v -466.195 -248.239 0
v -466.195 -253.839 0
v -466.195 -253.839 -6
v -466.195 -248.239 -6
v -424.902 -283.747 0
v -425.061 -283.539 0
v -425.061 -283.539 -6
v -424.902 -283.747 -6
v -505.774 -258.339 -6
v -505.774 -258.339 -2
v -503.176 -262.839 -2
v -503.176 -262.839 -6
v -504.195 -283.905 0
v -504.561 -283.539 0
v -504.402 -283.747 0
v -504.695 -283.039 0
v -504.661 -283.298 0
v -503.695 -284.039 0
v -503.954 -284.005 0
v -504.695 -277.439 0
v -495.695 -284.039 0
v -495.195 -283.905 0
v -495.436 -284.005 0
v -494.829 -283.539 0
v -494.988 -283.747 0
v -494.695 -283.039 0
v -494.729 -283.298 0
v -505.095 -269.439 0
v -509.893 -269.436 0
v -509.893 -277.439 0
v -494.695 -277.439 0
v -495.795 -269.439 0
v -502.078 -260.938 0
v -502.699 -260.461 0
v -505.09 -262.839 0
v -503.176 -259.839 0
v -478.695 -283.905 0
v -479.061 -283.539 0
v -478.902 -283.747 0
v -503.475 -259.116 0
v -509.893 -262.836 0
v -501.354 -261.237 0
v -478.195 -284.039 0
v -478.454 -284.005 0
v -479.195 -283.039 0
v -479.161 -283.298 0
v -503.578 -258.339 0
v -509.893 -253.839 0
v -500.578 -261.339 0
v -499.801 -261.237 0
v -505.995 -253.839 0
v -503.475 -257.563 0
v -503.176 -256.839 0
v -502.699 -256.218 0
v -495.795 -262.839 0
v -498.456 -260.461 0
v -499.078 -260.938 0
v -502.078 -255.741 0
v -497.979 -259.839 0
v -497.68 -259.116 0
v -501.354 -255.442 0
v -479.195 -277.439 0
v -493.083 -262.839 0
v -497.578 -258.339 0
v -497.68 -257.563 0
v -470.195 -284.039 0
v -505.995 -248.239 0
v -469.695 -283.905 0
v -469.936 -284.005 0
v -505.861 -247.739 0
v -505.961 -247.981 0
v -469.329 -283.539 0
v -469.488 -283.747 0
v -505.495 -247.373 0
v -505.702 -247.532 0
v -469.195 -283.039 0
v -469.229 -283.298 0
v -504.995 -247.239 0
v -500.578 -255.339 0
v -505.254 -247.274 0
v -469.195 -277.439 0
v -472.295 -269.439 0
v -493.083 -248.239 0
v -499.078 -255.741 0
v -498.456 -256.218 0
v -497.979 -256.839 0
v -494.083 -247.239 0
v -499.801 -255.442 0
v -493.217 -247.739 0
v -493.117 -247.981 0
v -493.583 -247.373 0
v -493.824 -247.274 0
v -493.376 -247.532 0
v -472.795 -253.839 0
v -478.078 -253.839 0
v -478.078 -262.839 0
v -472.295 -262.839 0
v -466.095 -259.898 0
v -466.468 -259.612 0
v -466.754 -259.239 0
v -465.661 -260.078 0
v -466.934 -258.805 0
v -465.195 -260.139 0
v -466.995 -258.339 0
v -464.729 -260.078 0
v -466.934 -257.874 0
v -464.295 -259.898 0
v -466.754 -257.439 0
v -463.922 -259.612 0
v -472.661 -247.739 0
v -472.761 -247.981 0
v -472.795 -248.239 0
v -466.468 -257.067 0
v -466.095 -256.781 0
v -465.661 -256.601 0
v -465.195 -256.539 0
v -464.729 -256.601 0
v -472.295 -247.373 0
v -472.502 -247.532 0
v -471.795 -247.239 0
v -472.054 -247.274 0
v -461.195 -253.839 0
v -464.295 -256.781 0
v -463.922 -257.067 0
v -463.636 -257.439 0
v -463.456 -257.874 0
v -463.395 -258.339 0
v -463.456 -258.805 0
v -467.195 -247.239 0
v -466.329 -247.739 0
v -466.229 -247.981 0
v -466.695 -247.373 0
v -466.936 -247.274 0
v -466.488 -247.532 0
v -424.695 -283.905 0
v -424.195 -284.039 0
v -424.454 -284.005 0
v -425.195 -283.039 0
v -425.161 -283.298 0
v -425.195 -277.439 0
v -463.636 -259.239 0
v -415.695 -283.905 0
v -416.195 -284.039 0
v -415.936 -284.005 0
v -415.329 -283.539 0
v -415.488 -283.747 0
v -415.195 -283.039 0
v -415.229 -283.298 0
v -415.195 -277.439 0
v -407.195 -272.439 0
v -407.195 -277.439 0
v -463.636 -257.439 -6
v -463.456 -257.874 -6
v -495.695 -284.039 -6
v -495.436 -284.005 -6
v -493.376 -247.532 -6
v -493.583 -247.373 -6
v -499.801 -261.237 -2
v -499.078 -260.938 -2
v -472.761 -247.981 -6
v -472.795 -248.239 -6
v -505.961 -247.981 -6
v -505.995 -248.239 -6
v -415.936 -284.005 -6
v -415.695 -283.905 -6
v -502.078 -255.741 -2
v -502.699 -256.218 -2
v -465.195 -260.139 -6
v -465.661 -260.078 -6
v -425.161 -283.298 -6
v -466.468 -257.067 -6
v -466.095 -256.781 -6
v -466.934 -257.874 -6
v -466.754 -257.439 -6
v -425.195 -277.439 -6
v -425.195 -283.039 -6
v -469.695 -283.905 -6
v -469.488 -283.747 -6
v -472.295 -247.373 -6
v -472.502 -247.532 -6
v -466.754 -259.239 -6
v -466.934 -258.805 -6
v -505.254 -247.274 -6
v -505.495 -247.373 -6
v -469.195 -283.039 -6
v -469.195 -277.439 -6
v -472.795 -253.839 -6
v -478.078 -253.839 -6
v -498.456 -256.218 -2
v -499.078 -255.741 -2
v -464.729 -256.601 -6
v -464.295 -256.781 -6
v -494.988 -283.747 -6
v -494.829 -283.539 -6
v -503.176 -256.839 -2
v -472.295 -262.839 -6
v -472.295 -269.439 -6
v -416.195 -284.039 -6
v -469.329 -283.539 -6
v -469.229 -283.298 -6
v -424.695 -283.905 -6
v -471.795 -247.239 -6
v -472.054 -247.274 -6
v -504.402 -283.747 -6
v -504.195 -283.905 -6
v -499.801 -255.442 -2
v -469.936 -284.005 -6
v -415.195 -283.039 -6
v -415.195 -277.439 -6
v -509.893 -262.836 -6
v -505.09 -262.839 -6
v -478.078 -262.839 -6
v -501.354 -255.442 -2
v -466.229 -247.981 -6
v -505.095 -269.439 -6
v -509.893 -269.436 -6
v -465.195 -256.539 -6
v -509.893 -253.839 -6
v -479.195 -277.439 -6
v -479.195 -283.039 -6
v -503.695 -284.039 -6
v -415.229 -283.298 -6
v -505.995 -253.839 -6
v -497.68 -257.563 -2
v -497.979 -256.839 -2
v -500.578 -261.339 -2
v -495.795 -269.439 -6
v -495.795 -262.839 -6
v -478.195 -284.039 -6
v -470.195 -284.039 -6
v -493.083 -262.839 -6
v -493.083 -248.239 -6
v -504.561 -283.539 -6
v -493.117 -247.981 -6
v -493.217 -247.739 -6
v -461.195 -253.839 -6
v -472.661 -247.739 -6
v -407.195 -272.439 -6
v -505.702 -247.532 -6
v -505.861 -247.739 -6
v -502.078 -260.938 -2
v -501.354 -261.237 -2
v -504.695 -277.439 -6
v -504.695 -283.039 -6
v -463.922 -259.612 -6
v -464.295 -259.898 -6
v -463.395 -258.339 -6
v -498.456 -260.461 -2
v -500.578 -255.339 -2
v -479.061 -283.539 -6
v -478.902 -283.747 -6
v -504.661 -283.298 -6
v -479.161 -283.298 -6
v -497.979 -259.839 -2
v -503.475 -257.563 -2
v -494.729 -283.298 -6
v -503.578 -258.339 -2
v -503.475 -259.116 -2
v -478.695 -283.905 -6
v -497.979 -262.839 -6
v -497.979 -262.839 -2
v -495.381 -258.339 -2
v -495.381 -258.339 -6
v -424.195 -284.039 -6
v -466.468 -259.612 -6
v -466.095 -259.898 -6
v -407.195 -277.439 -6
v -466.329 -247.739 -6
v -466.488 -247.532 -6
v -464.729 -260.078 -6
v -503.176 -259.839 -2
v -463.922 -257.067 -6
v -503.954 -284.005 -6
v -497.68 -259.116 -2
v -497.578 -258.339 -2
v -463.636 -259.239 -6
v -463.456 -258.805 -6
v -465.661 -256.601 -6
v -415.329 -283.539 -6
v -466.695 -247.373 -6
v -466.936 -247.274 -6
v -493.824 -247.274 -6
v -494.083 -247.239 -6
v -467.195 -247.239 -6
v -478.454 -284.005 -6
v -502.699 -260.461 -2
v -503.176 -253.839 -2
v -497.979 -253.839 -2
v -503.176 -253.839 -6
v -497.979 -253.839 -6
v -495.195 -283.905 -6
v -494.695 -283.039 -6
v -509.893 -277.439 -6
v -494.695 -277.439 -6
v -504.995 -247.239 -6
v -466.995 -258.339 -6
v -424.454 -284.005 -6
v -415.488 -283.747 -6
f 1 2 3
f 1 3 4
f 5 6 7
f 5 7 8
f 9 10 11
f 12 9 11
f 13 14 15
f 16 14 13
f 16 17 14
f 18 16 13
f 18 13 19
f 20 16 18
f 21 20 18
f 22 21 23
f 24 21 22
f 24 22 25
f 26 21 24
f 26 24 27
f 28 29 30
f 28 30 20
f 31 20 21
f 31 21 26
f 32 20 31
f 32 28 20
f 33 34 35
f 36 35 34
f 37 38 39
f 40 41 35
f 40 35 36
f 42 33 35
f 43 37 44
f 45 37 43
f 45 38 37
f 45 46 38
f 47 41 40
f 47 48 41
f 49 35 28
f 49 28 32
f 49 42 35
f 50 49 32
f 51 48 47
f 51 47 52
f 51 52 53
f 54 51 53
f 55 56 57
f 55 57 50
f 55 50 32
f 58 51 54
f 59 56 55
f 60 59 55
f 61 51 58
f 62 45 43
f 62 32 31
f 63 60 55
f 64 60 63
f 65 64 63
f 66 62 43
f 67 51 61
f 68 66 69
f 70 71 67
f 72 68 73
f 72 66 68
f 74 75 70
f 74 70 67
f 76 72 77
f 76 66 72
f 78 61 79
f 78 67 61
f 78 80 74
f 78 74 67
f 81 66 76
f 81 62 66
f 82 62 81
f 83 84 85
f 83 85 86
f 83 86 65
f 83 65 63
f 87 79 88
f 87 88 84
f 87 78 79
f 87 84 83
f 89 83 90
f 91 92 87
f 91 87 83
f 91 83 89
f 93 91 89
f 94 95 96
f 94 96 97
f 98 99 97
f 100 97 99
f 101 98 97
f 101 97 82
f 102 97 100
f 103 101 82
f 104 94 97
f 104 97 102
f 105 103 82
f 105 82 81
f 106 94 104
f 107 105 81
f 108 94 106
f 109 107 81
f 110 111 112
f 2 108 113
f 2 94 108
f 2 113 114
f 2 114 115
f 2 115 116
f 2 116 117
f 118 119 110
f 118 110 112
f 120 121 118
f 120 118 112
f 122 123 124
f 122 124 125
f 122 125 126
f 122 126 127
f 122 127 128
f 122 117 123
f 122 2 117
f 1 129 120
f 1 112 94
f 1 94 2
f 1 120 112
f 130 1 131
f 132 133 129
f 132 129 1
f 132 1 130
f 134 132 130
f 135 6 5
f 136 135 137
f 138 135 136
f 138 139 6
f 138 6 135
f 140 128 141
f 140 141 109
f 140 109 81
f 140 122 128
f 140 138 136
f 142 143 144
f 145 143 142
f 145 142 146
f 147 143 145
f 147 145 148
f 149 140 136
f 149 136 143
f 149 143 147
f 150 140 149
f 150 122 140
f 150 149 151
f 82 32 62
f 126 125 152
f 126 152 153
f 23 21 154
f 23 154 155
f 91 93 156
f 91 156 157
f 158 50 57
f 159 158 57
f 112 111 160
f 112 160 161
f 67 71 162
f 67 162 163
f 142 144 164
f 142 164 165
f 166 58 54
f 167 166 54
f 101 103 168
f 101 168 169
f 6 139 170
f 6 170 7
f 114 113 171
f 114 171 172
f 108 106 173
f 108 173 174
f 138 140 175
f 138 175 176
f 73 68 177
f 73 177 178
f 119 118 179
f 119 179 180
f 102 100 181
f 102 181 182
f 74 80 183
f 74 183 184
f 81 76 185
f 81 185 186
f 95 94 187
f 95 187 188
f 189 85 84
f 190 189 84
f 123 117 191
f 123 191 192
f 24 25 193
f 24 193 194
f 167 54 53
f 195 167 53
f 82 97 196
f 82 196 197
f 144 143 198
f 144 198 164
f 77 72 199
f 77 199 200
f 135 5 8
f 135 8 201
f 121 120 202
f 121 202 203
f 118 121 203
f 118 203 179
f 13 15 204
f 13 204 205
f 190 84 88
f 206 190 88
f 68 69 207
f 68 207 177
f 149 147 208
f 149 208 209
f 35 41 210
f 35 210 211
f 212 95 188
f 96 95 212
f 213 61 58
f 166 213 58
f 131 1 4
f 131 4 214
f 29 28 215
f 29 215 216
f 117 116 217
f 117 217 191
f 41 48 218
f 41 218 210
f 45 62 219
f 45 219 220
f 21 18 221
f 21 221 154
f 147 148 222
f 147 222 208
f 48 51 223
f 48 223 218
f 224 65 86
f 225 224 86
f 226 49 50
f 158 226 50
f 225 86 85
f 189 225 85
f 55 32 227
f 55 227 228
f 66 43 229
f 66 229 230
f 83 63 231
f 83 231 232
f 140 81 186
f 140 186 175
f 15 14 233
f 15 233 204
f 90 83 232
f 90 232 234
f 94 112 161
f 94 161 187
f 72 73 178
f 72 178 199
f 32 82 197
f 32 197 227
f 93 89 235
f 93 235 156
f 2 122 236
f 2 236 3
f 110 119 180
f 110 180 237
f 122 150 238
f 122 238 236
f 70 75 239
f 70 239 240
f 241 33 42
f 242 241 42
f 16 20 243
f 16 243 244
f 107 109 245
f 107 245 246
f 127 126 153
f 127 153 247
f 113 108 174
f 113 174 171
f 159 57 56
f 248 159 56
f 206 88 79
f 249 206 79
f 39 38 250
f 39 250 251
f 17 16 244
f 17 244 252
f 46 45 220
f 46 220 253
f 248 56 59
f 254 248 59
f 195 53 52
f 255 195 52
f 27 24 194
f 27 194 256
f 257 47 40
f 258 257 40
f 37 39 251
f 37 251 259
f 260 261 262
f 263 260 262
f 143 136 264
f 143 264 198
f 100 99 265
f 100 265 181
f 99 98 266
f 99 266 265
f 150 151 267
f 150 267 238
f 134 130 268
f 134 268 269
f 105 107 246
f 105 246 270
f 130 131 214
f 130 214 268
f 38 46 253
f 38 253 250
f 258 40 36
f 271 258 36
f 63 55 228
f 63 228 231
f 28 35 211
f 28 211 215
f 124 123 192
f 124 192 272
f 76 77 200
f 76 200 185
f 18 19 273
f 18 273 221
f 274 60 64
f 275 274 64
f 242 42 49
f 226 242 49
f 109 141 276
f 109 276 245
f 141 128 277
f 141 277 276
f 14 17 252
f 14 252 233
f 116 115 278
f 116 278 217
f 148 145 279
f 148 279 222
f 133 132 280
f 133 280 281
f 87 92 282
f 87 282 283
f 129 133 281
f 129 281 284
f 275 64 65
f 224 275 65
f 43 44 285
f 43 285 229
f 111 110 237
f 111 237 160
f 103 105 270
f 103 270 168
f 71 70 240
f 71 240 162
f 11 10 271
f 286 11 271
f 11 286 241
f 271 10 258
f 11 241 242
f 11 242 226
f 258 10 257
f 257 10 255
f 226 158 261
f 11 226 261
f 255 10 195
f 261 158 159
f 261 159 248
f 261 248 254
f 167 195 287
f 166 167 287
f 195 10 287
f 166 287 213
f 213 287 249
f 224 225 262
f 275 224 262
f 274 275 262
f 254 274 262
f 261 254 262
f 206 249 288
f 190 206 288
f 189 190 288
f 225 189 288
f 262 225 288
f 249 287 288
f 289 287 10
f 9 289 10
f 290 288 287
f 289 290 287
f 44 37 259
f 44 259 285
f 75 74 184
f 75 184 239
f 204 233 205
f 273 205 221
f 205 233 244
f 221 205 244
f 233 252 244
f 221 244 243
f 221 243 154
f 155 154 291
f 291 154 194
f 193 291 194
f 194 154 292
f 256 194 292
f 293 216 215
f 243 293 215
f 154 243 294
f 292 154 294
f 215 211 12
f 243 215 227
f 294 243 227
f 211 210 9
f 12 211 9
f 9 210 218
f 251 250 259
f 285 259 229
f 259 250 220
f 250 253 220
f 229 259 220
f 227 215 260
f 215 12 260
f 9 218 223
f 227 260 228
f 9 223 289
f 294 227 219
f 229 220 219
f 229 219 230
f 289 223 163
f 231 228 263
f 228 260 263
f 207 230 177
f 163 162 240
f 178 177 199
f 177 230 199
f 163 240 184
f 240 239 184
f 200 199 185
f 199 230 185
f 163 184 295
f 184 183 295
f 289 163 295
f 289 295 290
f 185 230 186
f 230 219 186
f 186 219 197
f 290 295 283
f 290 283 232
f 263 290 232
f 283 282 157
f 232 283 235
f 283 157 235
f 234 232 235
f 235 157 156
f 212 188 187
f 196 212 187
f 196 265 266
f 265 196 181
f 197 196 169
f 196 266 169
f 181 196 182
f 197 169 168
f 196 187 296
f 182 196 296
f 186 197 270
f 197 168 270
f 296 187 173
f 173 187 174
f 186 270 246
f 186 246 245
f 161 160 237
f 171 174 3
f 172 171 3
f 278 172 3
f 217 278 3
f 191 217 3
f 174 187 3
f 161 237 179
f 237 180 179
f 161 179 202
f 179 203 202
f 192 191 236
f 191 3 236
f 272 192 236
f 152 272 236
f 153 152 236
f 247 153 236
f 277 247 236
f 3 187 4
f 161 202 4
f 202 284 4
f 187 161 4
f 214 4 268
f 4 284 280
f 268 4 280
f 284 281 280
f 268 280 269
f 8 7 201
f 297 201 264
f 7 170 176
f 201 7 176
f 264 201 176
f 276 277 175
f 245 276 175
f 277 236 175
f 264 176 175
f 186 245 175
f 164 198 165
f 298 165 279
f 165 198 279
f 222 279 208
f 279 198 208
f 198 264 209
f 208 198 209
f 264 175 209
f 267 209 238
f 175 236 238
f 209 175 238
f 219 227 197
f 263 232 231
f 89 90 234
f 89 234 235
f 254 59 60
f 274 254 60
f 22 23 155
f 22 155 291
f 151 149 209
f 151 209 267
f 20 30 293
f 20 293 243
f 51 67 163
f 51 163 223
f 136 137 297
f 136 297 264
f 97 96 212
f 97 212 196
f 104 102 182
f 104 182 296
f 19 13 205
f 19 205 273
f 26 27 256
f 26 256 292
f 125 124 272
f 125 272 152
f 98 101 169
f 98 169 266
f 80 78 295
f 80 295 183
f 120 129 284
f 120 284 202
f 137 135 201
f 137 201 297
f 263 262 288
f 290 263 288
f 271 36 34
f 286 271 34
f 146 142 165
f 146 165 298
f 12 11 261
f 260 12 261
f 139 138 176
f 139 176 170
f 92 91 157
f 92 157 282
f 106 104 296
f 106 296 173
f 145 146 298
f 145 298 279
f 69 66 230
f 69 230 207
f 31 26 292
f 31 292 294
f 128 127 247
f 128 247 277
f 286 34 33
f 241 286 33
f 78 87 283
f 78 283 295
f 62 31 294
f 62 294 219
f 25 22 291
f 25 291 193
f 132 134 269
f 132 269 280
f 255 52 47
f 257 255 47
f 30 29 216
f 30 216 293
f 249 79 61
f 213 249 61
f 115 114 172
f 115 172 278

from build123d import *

# Parameters (mm, degrees)
BOSS_EXTRUDE1_DEPTH = 6
BOSS_EXTRUDE2_DEPTH = 2


with BuildPart() as part:
    # Sketch1 → Boss-Extrude1 (new body)
    with BuildSketch(Plane.XY):
        Polygon((-478.194997877, -284.039454162), (-470.194997877, -284.039454162), (-469.936178832, -284.005379989), (-469.694997877, -283.905479566), (-469.487891096, -283.746560944), (-469.328972474, -283.539454162), (-469.229072051, -283.298273207), (-469.194997877, -283.039454162), (-469.194997877, -277.439454162), (-425.194997877, -277.439454162), (-425.194997877, -283.039454162), (-425.160923704, -283.298273207), (-425.061023281, -283.539454162), (-424.902104659, -283.746560944), (-424.694997877, -283.905479566), (-424.453816922, -284.005379989), (-424.194997877, -284.039454162), (-416.194997877, -284.039454162), (-415.936178832, -284.005379989), (-415.694997877, -283.905479566), (-415.487891096, -283.746560944), (-415.328972474, -283.539454162), (-415.229072051, -283.298273207), (-415.194997877, -283.039454162), (-415.194997877, -277.439454162), (-407.194997877, -277.439454162), (-407.194997877, -272.439454162), (-461.194997877, -253.839454162), (-466.194997877, -253.839454162), (-466.194997877, -248.239454162), (-466.229072051, -247.980635117), (-466.328972474, -247.739454162), (-466.487891096, -247.532347381), (-466.694997877, -247.373428759), (-466.936178832, -247.273528336), (-467.194997877, -247.239454162), (-471.794997877, -247.239454162), (-472.053816922, -247.273528336), (-472.294997877, -247.373428759), (-472.502104659, -247.532347381), (-472.661023281, -247.739454162), (-472.760923704, -247.980635117), (-472.794997877, -248.239454162), (-472.794997877, -253.839454162), (-478.077534288, -253.839454162), (-478.077534288, -262.839454162), (-472.294997877, -262.839454162), (-472.294997877, -269.439454162), (-495.794997877, -269.439454162), (-495.794997877, -262.839454162), (-493.082722453, -262.839454162), (-493.082722453, -248.239454162), (-493.116796627, -247.980635117), (-493.21669705, -247.739454162), (-493.375615672, -247.532347381), (-493.582722453, -247.373428759), (-493.823903408, -247.273528336), (-494.082722453, -247.239454162), (-504.994997877, -247.239454162), (-505.253816922, -247.273528336), (-505.494997877, -247.373428759), (-505.702104659, -247.532347381), (-505.861023281, -247.739454162), (-505.960923704, -247.980635117), (-505.994997877, -248.239454162), (-505.994997877, -253.839454162), (-509.893267758, -253.839454162), (-509.893267758, -262.835675528), (-505.089806, -262.839454162), (-505.094997877, -269.439454162), (-509.893267758, -269.435677653), (-509.893267758, -277.439454162), (-504.694997877, -277.439454162), (-504.694997877, -283.039454162), (-504.660923704, -283.298273207), (-504.561023281, -283.539454162), (-504.402104659, -283.746560944), (-504.194997877, -283.905479566), (-503.953816922, -284.005379989), (-503.694997877, -284.039454162), (-495.694997877, -284.039454162), (-495.436178832, -284.005379989), (-495.194997877, -283.905479566), (-494.987891096, -283.746560944), (-494.828972474, -283.539454162), (-494.729072051, -283.298273207), (-494.694997877, -283.039454162), (-494.694997877, -277.439454162), (-479.194997877, -277.439454162), (-479.194997877, -283.039454162), (-479.160923704, -283.298273207), (-479.061023281, -283.539454162), (-478.902104659, -283.746560944), (-478.694997877, -283.905479566), (-478.453816922, -284.005379989), align=None)
        Polygon((-463.922205671, -257.066661956), (-463.636152151, -257.439454162), (-463.45633139, -257.873579881), (-463.394997877, -258.339454162), (-463.45633139, -258.805328444), (-463.636152151, -259.239454162), (-463.922205671, -259.612246369), (-464.294997877, -259.898299889), (-464.729123596, -260.07812065), (-465.194997877, -260.139454162), (-465.660872159, -260.07812065), (-466.094997877, -259.898299889), (-466.467790083, -259.612246369), (-466.753843604, -259.239454162), (-466.933664365, -258.805328444), (-466.994997877, -258.339454162), (-466.933664365, -257.873579881), (-466.753843604, -257.439454162), (-466.467790083, -257.066661956), (-466.094997877, -256.780608436), (-465.660872159, -256.600787675), (-465.194997877, -256.539454162), (-464.729123596, -256.600787675), (-464.294997877, -256.780608436), align=None, mode=Mode.SUBTRACT)
        Polygon((-503.1756105, -253.839454162), (-505.773686711, -258.339454162), (-503.1756105, -262.839454162), (-497.979458077, -262.839454162), (-495.381381866, -258.339454162), (-497.979458077, -253.839454162), align=None, mode=Mode.SUBTRACT)
    extrude(amount=-BOSS_EXTRUDE1_DEPTH)

    # Sketch1_4 → Boss-Extrude2 (add)
    with BuildSketch(Plane.XY):
        Polygon((-497.979458077, -262.839454162), (-495.381381866, -258.339454162), (-497.979458077, -253.839454162), (-503.1756105, -253.839454162), (-505.773686711, -258.339454162), (-503.1756105, -262.839454162), align=None)
        Polygon((-498.094928131, -254.039454162), (-503.060140446, -254.039454162), (-505.542746604, -258.339454162), (-503.060140446, -262.639454162), (-498.094928131, -262.639454162), (-495.612321973, -258.339454162), align=None, mode=Mode.SUBTRACT)
        Polygon((-495.612321973, -258.339454162), (-498.094928131, -254.039454162), (-503.060140446, -254.039454162), (-505.542746604, -258.339454162), (-503.060140446, -262.639454162), (-498.094928131, -262.639454162), align=None)
        Polygon((-498.210398185, -262.439454162), (-495.843262081, -258.339454162), (-498.210398185, -254.239454162), (-502.944670392, -254.239454162), (-505.311806496, -258.339454162), (-502.944670392, -262.439454162), align=None, mode=Mode.SUBTRACT)
        Polygon((-502.944670392, -262.439454162), (-498.210398185, -262.439454162), (-495.843262081, -258.339454162), (-498.210398185, -254.239454162), (-502.944670392, -254.239454162), (-505.311806496, -258.339454162), align=None)
        Polygon((-496.074202189, -258.339454162), (-498.325868239, -254.439454162), (-502.829200338, -254.439454162), (-505.080866388, -258.339454162), (-502.829200338, -262.239454162), (-498.325868239, -262.239454162), align=None, mode=Mode.SUBTRACT)
        Polygon((-498.325868239, -262.239454162), (-496.074202189, -258.339454162), (-498.325868239, -254.439454162), (-502.829200338, -254.439454162), (-505.080866388, -258.339454162), (-502.829200338, -262.239454162), align=None)
        Polygon((-496.305142296, -258.339454162), (-498.441338292, -254.639454162), (-502.713730284, -254.639454162), (-504.84992628, -258.339454162), (-502.713730284, -262.039454162), (-498.441338292, -262.039454162), align=None, mode=Mode.SUBTRACT)
        Polygon((-498.441338292, -262.039454162), (-496.305142296, -258.339454162), (-498.441338292, -254.639454162), (-502.713730284, -254.639454162), (-504.84992628, -258.339454162), (-502.713730284, -262.039454162), align=None)
        Polygon((-504.618986173, -258.339454162), (-502.598260231, -261.839454162), (-498.556808346, -261.839454162), (-496.536082404, -258.339454162), (-498.556808346, -254.839454162), (-502.598260231, -254.839454162), align=None, mode=Mode.SUBTRACT)
        Polygon((-502.598260231, -254.839454162), (-504.618986173, -258.339454162), (-502.598260231, -261.839454162), (-498.556808346, -261.839454162), (-496.536082404, -258.339454162), (-498.556808346, -254.839454162), align=None)
        Polygon((-502.482790177, -261.639454162), (-498.6722784, -261.639454162), (-496.767022512, -258.339454162), (-498.6722784, -255.039454162), (-502.482790177, -255.039454162), (-504.388046065, -258.339454162), align=None, mode=Mode.SUBTRACT)
        Polygon((-504.388046065, -258.339454162), (-502.482790177, -261.639454162), (-498.6722784, -261.639454162), (-496.767022512, -258.339454162), (-498.6722784, -255.039454162), (-502.482790177, -255.039454162), align=None)
        Polygon((-504.157105957, -258.339454162), (-502.367320123, -261.439454162), (-498.787748454, -261.439454162), (-496.99796262, -258.339454162), (-498.787748454, -255.239454162), (-502.367320123, -255.239454162), align=None, mode=Mode.SUBTRACT)
        Polygon((-502.367320123, -255.239454162), (-504.157105957, -258.339454162), (-502.367320123, -261.439454162), (-498.787748454, -261.439454162), (-496.99796262, -258.339454162), (-498.787748454, -255.239454162), align=None)
        Polygon((-503.475311767, -257.562997027), (-503.577534288, -258.339454162), (-503.475311767, -259.115911298), (-503.1756105, -259.839454162), (-502.698854632, -260.460774506), (-502.077534288, -260.937530374), (-501.353991424, -261.237231641), (-500.577534288, -261.339454162), (-499.801077153, -261.237231641), (-499.077534288, -260.937530374), (-498.456213945, -260.460774506), (-497.979458077, -259.839454162), (-497.67975681, -259.115911298), (-497.577534288, -258.339454162), (-497.67975681, -257.562997027), (-497.979458077, -256.839454162), (-498.456213945, -256.218133819), (-499.077534288, -255.741377951), (-499.801077153, -255.441676684), (-500.577534288, -255.339454162), (-501.353991424, -255.441676684), (-502.077534288, -255.741377951), (-502.698854632, -256.218133819), (-503.1756105, -256.839454162), align=None, mode=Mode.SUBTRACT)
    extrude(amount=-BOSS_EXTRUDE2_DEPTH)


solid = part.part
